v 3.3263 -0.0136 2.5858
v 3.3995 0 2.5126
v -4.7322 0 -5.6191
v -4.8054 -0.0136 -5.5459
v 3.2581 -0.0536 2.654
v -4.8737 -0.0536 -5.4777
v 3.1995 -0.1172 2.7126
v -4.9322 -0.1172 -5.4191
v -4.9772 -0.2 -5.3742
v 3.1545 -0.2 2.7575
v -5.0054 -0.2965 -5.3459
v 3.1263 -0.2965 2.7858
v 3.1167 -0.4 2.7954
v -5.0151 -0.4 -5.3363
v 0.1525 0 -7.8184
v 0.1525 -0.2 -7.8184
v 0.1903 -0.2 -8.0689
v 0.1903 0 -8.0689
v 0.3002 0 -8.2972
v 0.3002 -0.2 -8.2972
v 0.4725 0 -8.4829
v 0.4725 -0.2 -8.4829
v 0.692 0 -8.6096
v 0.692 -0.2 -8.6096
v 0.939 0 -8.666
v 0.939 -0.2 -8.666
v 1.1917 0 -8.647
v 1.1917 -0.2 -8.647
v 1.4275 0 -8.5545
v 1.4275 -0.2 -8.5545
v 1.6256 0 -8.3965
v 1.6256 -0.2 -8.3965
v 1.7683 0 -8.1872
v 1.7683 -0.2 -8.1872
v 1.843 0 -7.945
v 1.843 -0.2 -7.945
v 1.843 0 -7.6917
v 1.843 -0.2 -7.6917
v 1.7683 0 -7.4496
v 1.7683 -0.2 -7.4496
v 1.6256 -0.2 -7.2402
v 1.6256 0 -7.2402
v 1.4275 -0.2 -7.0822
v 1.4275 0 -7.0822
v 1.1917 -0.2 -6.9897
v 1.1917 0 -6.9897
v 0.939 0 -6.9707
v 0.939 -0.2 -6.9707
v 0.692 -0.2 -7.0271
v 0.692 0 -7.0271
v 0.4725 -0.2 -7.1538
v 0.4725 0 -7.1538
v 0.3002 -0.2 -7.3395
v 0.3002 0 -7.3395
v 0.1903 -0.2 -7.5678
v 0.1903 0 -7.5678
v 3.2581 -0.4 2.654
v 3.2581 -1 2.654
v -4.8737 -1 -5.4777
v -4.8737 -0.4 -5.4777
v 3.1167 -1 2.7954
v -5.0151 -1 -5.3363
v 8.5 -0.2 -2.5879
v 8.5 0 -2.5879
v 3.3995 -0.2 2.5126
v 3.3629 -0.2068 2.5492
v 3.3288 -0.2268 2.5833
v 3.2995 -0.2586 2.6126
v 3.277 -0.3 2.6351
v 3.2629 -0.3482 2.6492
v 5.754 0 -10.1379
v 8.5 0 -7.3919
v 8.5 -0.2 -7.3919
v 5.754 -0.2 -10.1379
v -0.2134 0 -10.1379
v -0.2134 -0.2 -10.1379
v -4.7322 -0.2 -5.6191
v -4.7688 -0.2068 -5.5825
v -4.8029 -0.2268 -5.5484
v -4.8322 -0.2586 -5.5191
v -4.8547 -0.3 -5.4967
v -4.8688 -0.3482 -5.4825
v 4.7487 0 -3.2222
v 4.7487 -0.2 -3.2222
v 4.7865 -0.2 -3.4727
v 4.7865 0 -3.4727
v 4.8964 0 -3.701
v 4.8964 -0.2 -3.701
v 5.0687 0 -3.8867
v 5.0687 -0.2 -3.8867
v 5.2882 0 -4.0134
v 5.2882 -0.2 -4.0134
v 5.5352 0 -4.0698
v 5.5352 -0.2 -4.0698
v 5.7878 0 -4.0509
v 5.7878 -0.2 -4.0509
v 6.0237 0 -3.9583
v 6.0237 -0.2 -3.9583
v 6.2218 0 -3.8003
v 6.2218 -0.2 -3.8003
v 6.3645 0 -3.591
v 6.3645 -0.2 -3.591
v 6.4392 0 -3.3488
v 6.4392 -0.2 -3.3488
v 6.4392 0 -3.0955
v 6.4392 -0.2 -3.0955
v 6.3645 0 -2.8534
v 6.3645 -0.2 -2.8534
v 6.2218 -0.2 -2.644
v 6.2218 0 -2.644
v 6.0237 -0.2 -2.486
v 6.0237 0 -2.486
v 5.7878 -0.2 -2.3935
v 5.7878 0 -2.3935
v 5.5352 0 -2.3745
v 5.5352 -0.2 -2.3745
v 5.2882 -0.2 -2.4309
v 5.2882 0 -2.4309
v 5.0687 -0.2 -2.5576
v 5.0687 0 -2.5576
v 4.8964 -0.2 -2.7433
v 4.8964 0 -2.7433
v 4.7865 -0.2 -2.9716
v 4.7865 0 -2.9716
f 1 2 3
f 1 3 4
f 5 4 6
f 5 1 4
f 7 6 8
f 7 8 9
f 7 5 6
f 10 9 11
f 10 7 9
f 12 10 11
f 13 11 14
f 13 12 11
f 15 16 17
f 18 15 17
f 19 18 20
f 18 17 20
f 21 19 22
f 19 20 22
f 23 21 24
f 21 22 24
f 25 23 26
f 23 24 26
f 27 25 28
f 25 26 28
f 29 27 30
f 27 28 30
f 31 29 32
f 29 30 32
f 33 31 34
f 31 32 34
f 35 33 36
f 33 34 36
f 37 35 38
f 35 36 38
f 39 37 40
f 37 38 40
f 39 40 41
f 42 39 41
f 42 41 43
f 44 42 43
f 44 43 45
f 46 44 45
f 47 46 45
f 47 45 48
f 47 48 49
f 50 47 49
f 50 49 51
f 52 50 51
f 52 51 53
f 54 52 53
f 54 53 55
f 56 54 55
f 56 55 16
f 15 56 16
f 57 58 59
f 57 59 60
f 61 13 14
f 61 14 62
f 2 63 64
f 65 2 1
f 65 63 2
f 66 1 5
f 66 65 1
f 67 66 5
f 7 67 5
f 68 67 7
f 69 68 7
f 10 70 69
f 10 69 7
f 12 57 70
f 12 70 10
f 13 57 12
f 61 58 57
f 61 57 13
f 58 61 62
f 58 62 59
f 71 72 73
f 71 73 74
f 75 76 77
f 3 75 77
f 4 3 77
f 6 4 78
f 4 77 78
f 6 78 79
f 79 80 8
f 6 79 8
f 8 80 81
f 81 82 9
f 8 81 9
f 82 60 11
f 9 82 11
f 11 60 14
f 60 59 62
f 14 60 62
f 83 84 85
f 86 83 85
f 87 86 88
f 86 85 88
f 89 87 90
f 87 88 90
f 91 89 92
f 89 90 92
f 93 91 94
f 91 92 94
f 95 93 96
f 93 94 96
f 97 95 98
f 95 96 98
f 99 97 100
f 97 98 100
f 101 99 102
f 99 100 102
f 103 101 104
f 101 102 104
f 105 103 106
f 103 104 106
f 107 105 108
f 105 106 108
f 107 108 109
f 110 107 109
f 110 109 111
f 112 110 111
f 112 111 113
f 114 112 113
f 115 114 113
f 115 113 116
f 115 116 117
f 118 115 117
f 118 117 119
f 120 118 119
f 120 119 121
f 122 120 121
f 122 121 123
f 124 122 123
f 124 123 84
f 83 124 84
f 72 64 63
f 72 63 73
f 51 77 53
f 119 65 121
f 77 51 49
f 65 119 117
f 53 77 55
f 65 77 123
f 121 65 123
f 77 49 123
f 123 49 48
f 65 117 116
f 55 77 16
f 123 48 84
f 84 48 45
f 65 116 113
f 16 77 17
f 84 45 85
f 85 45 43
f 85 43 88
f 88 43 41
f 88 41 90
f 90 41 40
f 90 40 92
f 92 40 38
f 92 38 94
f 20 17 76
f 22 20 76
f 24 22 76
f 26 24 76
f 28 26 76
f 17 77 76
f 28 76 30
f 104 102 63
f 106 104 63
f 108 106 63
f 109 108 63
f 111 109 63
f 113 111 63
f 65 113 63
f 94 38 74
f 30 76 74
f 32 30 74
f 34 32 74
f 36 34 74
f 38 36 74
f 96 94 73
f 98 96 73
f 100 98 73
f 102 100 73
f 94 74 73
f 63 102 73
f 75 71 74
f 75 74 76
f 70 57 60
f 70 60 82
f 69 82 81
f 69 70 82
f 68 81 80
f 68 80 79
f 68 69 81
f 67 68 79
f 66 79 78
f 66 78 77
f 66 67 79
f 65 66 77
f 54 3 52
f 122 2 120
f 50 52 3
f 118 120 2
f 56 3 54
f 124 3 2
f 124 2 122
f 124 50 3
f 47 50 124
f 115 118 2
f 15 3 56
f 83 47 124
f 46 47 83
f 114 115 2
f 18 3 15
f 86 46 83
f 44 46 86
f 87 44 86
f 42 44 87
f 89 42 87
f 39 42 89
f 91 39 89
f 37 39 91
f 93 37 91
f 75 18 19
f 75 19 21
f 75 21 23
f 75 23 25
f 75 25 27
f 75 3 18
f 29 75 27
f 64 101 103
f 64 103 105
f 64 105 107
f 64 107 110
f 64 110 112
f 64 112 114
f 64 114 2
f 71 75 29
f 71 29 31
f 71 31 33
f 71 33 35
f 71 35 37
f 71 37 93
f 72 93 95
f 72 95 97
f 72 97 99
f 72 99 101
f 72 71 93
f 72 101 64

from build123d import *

# Parameters (mm, degrees)
BASE_FLANGE1_DEPTH           = 0.2
EDGE_FLANGE1_STRIP_W         = 1.2
EDGE_FLANGE1_STRIP_H         = 0.2
EDGE_FLANGE1_STRIP_CUT_DEPTH = 11.5
EDGE_FLANGE1_DEPTH           = 11.5
F_1_7_1_7_DIAMETER_HOLE1_D   = 1.7


# Sheet-metal steps are written as plain solids
with BuildPart() as part:
    # Sketch1 → Base-Flange1 (new body)
    with BuildSketch(Plane(origin=(0, 0, 0), x_dir=(1, 0, 0), z_dir=(0, 1, 0))):
        Polygon((5.75399352, 10.137943159), (-0.213435895, 10.137943159), (-4.873652989, 5.477726065), (3.258074995, -2.654001919), (8.5, 2.587923086), (8.5, 7.391936679), align=None)
    extrude(amount=-BASE_FLANGE1_DEPTH)

    # Edge-Flange1 strip (across the edge) → Edge-Flange1 strip cut (cut)
    with BuildSketch(Plane(origin=(3.258074995, -0.2, 2.654001919), x_dir=(0.707106781186555, -3.4914813388431337e-15, -0.70710678118654), z_dir=(-0.70710678118654, 0, -0.707106781186555))):
        with Locations((-0.4, -0.1)):
            Rectangle(EDGE_FLANGE1_STRIP_W, EDGE_FLANGE1_STRIP_H)
    extrude(amount=EDGE_FLANGE1_STRIP_CUT_DEPTH, mode=Mode.SUBTRACT)

    # Edge-Flange1 section (across the edge) → Edge-Flange1 (add)
    with BuildSketch(Plane(origin=(3.258074995, -0.2, 2.654001919), x_dir=(0.707106781186555, -3.4914813388431337e-15, -0.70710678118654), z_dir=(-0.70710678118654, 0, -0.707106781186555))):
        with BuildLine():
            Line((-0.2, 0.2), (-0.2, 0.8))
            Line((-0.2, 0.8), (0, 0.8))
            Line((0, 0.8), (0, 0.2))
            ThreePointArc((0, 0.2), (0.058578644, 0.058578644), (0.2, 0))
            Line((0.2, 0), (0.2, -0.2))
            ThreePointArc((0.2, -0.2), (-0.082842712, -0.082842712), (-0.2, 0.2))
        make_face()
    extrude(amount=EDGE_FLANGE1_DEPTH)

    # Ø1.7 (1.7) Diameter Hole1 (through all)
    with Locations(Plane(origin=(0, 0, 0), x_dir=(1, 0, 0), z_dir=(0, 1, 0))):
        with Locations((1.00251186, 7.818357007), (5.598705937, 3.22216293)):
            Hole(F_1_7_1_7_DIAMETER_HOLE1_D / 2)


solid = part.part
